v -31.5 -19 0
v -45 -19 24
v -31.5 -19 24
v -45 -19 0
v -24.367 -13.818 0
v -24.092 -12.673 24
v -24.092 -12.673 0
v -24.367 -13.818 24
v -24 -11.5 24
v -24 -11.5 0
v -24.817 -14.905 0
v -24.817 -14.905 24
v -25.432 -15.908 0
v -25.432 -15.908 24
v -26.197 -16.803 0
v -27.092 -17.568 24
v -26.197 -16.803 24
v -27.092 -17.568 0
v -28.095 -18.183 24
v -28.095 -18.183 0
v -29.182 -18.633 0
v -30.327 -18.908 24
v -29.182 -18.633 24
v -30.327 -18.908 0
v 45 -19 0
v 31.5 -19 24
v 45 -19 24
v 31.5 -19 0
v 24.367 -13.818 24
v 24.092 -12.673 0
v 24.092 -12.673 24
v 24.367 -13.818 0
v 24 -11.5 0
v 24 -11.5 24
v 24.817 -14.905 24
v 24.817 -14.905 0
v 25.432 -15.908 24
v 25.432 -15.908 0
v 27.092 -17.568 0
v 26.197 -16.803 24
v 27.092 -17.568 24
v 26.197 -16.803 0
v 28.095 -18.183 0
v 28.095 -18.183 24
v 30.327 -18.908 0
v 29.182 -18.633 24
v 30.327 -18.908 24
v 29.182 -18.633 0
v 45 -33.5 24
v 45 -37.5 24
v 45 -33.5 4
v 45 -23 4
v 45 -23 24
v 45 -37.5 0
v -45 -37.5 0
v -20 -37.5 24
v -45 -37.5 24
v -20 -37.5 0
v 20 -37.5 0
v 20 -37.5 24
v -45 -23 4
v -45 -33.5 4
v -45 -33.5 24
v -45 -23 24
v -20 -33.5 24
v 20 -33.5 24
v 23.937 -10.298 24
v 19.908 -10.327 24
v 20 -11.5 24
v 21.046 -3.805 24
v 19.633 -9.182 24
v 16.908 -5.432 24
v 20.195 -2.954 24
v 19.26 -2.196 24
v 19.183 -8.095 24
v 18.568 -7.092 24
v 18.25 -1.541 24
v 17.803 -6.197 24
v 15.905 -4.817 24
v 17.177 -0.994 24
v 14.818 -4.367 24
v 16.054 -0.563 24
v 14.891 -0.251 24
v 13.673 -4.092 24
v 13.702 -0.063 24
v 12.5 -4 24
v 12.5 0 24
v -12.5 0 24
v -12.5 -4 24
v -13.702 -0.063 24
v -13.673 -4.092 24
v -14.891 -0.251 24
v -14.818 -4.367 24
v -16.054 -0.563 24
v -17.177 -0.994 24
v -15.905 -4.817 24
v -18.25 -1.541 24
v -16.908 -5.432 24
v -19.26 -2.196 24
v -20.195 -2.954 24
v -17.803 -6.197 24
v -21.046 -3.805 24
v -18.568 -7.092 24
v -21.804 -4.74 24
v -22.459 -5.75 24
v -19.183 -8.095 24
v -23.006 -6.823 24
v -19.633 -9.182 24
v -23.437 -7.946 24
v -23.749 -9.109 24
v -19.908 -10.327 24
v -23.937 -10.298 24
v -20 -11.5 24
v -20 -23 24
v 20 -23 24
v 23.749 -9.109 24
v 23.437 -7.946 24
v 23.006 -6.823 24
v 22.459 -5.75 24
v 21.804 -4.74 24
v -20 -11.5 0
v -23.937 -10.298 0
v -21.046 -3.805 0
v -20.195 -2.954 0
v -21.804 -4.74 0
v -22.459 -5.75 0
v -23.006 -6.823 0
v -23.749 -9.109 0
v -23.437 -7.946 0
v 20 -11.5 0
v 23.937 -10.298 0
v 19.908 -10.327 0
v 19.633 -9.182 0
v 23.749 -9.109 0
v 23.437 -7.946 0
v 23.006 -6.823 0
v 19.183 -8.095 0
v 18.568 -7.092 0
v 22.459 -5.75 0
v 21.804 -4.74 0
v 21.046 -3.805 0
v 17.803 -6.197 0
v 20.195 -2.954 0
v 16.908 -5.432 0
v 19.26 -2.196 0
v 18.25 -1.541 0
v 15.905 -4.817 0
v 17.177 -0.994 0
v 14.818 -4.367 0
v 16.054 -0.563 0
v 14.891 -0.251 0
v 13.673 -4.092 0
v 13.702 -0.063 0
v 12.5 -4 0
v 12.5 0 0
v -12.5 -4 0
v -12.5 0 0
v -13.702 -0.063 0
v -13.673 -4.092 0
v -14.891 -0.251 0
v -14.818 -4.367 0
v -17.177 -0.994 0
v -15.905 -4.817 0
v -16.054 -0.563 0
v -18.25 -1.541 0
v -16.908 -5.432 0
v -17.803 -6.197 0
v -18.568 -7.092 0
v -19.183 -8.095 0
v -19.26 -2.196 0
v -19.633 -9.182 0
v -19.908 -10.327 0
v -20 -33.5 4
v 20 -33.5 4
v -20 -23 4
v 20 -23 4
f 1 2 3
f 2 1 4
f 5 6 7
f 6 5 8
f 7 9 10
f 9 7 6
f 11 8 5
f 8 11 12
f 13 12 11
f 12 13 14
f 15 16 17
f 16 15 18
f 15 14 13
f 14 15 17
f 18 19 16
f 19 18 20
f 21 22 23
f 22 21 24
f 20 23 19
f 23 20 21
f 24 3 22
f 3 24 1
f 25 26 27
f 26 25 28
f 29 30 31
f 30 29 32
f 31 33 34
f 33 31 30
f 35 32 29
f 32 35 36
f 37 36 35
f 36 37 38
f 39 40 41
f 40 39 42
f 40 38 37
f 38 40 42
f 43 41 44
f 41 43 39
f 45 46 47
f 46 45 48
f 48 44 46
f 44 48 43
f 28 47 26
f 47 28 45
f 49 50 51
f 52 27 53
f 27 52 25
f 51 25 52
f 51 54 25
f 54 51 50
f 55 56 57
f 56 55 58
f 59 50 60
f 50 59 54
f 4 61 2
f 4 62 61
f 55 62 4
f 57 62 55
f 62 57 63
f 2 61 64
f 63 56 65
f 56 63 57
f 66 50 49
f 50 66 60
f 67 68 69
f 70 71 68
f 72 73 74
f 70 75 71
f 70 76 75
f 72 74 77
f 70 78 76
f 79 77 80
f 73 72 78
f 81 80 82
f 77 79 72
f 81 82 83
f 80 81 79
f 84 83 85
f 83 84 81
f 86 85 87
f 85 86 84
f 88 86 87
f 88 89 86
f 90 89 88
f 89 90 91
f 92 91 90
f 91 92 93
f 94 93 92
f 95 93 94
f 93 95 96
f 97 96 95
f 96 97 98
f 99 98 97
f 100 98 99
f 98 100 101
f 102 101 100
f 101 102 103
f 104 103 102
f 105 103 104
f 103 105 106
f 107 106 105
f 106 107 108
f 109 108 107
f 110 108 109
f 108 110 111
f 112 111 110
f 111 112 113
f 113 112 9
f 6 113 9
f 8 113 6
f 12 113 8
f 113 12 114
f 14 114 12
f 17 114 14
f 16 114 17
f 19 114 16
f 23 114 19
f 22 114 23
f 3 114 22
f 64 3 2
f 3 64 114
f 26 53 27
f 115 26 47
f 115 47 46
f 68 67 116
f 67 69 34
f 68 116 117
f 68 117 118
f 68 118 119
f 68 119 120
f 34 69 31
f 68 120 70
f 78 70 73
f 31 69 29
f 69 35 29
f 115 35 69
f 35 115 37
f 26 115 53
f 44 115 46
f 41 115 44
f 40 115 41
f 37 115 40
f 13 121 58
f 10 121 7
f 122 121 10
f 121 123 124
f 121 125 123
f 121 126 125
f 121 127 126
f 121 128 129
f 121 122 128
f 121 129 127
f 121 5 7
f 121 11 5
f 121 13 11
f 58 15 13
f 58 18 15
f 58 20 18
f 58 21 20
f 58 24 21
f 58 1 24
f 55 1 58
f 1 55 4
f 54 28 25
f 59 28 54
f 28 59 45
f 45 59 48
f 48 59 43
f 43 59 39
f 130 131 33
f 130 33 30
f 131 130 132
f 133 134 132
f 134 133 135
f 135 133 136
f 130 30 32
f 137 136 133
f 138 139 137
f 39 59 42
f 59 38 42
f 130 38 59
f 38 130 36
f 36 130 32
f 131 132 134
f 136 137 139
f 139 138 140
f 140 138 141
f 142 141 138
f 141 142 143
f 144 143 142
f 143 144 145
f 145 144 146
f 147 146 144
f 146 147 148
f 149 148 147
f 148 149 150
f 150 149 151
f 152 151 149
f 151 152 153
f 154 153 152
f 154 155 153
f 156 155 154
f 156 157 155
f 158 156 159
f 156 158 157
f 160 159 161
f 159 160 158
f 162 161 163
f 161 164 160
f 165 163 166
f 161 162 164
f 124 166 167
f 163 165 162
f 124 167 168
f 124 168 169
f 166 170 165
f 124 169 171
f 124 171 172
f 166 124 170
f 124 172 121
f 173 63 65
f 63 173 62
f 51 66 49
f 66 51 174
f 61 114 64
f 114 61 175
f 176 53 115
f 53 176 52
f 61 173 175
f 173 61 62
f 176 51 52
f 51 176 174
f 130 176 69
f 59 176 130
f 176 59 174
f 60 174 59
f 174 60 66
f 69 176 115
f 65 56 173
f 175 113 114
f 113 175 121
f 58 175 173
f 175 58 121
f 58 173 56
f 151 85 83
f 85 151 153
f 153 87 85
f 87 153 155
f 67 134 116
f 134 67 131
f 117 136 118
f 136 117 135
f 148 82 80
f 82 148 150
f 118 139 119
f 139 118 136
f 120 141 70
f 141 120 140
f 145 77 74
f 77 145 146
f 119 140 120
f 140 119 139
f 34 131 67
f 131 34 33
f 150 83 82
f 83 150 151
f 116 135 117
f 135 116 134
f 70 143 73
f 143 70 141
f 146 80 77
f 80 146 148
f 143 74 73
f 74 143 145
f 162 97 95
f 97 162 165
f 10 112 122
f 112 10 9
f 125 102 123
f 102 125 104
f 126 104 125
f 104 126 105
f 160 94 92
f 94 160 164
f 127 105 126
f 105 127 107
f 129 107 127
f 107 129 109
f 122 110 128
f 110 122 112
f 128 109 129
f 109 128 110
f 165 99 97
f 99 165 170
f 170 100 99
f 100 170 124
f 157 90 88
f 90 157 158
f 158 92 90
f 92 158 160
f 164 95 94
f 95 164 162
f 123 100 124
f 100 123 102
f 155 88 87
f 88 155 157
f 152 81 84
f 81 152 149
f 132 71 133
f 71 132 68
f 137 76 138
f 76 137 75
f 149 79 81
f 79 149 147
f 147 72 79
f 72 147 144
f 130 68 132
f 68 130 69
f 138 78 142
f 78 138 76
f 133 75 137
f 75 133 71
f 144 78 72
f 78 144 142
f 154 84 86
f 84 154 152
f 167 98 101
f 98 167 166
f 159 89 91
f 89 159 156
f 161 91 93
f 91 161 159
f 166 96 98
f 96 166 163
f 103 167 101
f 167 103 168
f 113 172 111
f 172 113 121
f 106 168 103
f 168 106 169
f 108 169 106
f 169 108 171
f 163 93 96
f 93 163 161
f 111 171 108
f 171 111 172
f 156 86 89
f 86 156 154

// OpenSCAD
////////////////////////////////////////////////////////////////////////////////
// Tisch Kabel Klammer
////////////////////////////////////////////////////////////////////////////////

// wall thickness
wall = 4 ;

// table top height
height1 = 10.5 ;

// cable height
height2 = 15 ;

height = 3 * wall + height1 + height2 ;

// table top width
width1 = 25 ;

// cable width
width2 = 40 ;

width = 2 * width1 + width2 ;

depth1 = 20 ;
depth = depth1 + wall;

r = min(height2/2, width2/2) ;
rO = r+wall ;

////////////////////////////////////////////////////////////////////////////////

module outer()
{
  module cut()
  {
    cube([width1, depth + 2*wall, height2+2*wall - r]) ;
    cube([width1 - r, depth + 2*wall, height2+2*wall]) ;
    translate([width1 - r, depth/2+wall, height2+2*wall-r]) rotate([90, 0, 0]) cylinder(r = r, h = depth+2*wall, center=true, $fn=40) ;
  }

  difference()
    {
      translate([-width/2, 0, height2+wall - r]) cube([width, depth, height1+2*wall + r]) ;

      translate([-width/2-wall, wall, height2+2*wall]) cube([width+2*wall, depth+2*wall, height1]) ;

      translate([-width/2-wall, -wall, -wall]) cut() ;
      translate([width/2+wall, -wall, -wall]) mirror([1,0,0]) cut() ;

      translate([-width2/2, -wall, -wall]) cube([width2, depth+2*wall, height+2*wall]) ;
    }
}

module inner()
{
  module cut()
  {
    translate([0, depth/2, height/2+wall + r]) cube([width2, depth+2*wall, height], center=true) ;

    translate([width2/2-r, depth/2, r+wall]) rotate([90,0,0]) cylinder(r = r, h = depth+2*wall, center=true, $fn=40) ;
    translate([-width2/2+r, depth/2, r+wall]) rotate([90,0,0]) cylinder(r = r, h = depth+2*wall, center=true, $fn=40) ;

    translate([0, depth/2,(height2+wall)/2 + wall]) cube([width2-2*r, depth+2*wall, height2+wall], center=true) ;
  }

  difference()
    {
      union()
      {
        translate([0, depth/2, (height2+wall)/2 +rO/2]) cube([width2+2*wall, depth, height2+wall - rO], center=true) ;

        translate([width2/2-rO+wall, depth/2, rO]) rotate([90,0,0]) cylinder(r = rO, h = depth, center=true, $fn=60) ;
        translate([-width2/2+rO-wall, depth/2, rO]) rotate([90,0,0]) cylinder(r = rO, h = depth, center=true, $fn=60) ;

        translate([0, depth/2,(height2+wall)/2]) cube([width2+2*wall-2*rO, depth, height2+wall], center=true) ;
      }

      cut() ;
    }
}

rotate([90, 0, 0])
{
  outer() ;
  inner() ;
}
